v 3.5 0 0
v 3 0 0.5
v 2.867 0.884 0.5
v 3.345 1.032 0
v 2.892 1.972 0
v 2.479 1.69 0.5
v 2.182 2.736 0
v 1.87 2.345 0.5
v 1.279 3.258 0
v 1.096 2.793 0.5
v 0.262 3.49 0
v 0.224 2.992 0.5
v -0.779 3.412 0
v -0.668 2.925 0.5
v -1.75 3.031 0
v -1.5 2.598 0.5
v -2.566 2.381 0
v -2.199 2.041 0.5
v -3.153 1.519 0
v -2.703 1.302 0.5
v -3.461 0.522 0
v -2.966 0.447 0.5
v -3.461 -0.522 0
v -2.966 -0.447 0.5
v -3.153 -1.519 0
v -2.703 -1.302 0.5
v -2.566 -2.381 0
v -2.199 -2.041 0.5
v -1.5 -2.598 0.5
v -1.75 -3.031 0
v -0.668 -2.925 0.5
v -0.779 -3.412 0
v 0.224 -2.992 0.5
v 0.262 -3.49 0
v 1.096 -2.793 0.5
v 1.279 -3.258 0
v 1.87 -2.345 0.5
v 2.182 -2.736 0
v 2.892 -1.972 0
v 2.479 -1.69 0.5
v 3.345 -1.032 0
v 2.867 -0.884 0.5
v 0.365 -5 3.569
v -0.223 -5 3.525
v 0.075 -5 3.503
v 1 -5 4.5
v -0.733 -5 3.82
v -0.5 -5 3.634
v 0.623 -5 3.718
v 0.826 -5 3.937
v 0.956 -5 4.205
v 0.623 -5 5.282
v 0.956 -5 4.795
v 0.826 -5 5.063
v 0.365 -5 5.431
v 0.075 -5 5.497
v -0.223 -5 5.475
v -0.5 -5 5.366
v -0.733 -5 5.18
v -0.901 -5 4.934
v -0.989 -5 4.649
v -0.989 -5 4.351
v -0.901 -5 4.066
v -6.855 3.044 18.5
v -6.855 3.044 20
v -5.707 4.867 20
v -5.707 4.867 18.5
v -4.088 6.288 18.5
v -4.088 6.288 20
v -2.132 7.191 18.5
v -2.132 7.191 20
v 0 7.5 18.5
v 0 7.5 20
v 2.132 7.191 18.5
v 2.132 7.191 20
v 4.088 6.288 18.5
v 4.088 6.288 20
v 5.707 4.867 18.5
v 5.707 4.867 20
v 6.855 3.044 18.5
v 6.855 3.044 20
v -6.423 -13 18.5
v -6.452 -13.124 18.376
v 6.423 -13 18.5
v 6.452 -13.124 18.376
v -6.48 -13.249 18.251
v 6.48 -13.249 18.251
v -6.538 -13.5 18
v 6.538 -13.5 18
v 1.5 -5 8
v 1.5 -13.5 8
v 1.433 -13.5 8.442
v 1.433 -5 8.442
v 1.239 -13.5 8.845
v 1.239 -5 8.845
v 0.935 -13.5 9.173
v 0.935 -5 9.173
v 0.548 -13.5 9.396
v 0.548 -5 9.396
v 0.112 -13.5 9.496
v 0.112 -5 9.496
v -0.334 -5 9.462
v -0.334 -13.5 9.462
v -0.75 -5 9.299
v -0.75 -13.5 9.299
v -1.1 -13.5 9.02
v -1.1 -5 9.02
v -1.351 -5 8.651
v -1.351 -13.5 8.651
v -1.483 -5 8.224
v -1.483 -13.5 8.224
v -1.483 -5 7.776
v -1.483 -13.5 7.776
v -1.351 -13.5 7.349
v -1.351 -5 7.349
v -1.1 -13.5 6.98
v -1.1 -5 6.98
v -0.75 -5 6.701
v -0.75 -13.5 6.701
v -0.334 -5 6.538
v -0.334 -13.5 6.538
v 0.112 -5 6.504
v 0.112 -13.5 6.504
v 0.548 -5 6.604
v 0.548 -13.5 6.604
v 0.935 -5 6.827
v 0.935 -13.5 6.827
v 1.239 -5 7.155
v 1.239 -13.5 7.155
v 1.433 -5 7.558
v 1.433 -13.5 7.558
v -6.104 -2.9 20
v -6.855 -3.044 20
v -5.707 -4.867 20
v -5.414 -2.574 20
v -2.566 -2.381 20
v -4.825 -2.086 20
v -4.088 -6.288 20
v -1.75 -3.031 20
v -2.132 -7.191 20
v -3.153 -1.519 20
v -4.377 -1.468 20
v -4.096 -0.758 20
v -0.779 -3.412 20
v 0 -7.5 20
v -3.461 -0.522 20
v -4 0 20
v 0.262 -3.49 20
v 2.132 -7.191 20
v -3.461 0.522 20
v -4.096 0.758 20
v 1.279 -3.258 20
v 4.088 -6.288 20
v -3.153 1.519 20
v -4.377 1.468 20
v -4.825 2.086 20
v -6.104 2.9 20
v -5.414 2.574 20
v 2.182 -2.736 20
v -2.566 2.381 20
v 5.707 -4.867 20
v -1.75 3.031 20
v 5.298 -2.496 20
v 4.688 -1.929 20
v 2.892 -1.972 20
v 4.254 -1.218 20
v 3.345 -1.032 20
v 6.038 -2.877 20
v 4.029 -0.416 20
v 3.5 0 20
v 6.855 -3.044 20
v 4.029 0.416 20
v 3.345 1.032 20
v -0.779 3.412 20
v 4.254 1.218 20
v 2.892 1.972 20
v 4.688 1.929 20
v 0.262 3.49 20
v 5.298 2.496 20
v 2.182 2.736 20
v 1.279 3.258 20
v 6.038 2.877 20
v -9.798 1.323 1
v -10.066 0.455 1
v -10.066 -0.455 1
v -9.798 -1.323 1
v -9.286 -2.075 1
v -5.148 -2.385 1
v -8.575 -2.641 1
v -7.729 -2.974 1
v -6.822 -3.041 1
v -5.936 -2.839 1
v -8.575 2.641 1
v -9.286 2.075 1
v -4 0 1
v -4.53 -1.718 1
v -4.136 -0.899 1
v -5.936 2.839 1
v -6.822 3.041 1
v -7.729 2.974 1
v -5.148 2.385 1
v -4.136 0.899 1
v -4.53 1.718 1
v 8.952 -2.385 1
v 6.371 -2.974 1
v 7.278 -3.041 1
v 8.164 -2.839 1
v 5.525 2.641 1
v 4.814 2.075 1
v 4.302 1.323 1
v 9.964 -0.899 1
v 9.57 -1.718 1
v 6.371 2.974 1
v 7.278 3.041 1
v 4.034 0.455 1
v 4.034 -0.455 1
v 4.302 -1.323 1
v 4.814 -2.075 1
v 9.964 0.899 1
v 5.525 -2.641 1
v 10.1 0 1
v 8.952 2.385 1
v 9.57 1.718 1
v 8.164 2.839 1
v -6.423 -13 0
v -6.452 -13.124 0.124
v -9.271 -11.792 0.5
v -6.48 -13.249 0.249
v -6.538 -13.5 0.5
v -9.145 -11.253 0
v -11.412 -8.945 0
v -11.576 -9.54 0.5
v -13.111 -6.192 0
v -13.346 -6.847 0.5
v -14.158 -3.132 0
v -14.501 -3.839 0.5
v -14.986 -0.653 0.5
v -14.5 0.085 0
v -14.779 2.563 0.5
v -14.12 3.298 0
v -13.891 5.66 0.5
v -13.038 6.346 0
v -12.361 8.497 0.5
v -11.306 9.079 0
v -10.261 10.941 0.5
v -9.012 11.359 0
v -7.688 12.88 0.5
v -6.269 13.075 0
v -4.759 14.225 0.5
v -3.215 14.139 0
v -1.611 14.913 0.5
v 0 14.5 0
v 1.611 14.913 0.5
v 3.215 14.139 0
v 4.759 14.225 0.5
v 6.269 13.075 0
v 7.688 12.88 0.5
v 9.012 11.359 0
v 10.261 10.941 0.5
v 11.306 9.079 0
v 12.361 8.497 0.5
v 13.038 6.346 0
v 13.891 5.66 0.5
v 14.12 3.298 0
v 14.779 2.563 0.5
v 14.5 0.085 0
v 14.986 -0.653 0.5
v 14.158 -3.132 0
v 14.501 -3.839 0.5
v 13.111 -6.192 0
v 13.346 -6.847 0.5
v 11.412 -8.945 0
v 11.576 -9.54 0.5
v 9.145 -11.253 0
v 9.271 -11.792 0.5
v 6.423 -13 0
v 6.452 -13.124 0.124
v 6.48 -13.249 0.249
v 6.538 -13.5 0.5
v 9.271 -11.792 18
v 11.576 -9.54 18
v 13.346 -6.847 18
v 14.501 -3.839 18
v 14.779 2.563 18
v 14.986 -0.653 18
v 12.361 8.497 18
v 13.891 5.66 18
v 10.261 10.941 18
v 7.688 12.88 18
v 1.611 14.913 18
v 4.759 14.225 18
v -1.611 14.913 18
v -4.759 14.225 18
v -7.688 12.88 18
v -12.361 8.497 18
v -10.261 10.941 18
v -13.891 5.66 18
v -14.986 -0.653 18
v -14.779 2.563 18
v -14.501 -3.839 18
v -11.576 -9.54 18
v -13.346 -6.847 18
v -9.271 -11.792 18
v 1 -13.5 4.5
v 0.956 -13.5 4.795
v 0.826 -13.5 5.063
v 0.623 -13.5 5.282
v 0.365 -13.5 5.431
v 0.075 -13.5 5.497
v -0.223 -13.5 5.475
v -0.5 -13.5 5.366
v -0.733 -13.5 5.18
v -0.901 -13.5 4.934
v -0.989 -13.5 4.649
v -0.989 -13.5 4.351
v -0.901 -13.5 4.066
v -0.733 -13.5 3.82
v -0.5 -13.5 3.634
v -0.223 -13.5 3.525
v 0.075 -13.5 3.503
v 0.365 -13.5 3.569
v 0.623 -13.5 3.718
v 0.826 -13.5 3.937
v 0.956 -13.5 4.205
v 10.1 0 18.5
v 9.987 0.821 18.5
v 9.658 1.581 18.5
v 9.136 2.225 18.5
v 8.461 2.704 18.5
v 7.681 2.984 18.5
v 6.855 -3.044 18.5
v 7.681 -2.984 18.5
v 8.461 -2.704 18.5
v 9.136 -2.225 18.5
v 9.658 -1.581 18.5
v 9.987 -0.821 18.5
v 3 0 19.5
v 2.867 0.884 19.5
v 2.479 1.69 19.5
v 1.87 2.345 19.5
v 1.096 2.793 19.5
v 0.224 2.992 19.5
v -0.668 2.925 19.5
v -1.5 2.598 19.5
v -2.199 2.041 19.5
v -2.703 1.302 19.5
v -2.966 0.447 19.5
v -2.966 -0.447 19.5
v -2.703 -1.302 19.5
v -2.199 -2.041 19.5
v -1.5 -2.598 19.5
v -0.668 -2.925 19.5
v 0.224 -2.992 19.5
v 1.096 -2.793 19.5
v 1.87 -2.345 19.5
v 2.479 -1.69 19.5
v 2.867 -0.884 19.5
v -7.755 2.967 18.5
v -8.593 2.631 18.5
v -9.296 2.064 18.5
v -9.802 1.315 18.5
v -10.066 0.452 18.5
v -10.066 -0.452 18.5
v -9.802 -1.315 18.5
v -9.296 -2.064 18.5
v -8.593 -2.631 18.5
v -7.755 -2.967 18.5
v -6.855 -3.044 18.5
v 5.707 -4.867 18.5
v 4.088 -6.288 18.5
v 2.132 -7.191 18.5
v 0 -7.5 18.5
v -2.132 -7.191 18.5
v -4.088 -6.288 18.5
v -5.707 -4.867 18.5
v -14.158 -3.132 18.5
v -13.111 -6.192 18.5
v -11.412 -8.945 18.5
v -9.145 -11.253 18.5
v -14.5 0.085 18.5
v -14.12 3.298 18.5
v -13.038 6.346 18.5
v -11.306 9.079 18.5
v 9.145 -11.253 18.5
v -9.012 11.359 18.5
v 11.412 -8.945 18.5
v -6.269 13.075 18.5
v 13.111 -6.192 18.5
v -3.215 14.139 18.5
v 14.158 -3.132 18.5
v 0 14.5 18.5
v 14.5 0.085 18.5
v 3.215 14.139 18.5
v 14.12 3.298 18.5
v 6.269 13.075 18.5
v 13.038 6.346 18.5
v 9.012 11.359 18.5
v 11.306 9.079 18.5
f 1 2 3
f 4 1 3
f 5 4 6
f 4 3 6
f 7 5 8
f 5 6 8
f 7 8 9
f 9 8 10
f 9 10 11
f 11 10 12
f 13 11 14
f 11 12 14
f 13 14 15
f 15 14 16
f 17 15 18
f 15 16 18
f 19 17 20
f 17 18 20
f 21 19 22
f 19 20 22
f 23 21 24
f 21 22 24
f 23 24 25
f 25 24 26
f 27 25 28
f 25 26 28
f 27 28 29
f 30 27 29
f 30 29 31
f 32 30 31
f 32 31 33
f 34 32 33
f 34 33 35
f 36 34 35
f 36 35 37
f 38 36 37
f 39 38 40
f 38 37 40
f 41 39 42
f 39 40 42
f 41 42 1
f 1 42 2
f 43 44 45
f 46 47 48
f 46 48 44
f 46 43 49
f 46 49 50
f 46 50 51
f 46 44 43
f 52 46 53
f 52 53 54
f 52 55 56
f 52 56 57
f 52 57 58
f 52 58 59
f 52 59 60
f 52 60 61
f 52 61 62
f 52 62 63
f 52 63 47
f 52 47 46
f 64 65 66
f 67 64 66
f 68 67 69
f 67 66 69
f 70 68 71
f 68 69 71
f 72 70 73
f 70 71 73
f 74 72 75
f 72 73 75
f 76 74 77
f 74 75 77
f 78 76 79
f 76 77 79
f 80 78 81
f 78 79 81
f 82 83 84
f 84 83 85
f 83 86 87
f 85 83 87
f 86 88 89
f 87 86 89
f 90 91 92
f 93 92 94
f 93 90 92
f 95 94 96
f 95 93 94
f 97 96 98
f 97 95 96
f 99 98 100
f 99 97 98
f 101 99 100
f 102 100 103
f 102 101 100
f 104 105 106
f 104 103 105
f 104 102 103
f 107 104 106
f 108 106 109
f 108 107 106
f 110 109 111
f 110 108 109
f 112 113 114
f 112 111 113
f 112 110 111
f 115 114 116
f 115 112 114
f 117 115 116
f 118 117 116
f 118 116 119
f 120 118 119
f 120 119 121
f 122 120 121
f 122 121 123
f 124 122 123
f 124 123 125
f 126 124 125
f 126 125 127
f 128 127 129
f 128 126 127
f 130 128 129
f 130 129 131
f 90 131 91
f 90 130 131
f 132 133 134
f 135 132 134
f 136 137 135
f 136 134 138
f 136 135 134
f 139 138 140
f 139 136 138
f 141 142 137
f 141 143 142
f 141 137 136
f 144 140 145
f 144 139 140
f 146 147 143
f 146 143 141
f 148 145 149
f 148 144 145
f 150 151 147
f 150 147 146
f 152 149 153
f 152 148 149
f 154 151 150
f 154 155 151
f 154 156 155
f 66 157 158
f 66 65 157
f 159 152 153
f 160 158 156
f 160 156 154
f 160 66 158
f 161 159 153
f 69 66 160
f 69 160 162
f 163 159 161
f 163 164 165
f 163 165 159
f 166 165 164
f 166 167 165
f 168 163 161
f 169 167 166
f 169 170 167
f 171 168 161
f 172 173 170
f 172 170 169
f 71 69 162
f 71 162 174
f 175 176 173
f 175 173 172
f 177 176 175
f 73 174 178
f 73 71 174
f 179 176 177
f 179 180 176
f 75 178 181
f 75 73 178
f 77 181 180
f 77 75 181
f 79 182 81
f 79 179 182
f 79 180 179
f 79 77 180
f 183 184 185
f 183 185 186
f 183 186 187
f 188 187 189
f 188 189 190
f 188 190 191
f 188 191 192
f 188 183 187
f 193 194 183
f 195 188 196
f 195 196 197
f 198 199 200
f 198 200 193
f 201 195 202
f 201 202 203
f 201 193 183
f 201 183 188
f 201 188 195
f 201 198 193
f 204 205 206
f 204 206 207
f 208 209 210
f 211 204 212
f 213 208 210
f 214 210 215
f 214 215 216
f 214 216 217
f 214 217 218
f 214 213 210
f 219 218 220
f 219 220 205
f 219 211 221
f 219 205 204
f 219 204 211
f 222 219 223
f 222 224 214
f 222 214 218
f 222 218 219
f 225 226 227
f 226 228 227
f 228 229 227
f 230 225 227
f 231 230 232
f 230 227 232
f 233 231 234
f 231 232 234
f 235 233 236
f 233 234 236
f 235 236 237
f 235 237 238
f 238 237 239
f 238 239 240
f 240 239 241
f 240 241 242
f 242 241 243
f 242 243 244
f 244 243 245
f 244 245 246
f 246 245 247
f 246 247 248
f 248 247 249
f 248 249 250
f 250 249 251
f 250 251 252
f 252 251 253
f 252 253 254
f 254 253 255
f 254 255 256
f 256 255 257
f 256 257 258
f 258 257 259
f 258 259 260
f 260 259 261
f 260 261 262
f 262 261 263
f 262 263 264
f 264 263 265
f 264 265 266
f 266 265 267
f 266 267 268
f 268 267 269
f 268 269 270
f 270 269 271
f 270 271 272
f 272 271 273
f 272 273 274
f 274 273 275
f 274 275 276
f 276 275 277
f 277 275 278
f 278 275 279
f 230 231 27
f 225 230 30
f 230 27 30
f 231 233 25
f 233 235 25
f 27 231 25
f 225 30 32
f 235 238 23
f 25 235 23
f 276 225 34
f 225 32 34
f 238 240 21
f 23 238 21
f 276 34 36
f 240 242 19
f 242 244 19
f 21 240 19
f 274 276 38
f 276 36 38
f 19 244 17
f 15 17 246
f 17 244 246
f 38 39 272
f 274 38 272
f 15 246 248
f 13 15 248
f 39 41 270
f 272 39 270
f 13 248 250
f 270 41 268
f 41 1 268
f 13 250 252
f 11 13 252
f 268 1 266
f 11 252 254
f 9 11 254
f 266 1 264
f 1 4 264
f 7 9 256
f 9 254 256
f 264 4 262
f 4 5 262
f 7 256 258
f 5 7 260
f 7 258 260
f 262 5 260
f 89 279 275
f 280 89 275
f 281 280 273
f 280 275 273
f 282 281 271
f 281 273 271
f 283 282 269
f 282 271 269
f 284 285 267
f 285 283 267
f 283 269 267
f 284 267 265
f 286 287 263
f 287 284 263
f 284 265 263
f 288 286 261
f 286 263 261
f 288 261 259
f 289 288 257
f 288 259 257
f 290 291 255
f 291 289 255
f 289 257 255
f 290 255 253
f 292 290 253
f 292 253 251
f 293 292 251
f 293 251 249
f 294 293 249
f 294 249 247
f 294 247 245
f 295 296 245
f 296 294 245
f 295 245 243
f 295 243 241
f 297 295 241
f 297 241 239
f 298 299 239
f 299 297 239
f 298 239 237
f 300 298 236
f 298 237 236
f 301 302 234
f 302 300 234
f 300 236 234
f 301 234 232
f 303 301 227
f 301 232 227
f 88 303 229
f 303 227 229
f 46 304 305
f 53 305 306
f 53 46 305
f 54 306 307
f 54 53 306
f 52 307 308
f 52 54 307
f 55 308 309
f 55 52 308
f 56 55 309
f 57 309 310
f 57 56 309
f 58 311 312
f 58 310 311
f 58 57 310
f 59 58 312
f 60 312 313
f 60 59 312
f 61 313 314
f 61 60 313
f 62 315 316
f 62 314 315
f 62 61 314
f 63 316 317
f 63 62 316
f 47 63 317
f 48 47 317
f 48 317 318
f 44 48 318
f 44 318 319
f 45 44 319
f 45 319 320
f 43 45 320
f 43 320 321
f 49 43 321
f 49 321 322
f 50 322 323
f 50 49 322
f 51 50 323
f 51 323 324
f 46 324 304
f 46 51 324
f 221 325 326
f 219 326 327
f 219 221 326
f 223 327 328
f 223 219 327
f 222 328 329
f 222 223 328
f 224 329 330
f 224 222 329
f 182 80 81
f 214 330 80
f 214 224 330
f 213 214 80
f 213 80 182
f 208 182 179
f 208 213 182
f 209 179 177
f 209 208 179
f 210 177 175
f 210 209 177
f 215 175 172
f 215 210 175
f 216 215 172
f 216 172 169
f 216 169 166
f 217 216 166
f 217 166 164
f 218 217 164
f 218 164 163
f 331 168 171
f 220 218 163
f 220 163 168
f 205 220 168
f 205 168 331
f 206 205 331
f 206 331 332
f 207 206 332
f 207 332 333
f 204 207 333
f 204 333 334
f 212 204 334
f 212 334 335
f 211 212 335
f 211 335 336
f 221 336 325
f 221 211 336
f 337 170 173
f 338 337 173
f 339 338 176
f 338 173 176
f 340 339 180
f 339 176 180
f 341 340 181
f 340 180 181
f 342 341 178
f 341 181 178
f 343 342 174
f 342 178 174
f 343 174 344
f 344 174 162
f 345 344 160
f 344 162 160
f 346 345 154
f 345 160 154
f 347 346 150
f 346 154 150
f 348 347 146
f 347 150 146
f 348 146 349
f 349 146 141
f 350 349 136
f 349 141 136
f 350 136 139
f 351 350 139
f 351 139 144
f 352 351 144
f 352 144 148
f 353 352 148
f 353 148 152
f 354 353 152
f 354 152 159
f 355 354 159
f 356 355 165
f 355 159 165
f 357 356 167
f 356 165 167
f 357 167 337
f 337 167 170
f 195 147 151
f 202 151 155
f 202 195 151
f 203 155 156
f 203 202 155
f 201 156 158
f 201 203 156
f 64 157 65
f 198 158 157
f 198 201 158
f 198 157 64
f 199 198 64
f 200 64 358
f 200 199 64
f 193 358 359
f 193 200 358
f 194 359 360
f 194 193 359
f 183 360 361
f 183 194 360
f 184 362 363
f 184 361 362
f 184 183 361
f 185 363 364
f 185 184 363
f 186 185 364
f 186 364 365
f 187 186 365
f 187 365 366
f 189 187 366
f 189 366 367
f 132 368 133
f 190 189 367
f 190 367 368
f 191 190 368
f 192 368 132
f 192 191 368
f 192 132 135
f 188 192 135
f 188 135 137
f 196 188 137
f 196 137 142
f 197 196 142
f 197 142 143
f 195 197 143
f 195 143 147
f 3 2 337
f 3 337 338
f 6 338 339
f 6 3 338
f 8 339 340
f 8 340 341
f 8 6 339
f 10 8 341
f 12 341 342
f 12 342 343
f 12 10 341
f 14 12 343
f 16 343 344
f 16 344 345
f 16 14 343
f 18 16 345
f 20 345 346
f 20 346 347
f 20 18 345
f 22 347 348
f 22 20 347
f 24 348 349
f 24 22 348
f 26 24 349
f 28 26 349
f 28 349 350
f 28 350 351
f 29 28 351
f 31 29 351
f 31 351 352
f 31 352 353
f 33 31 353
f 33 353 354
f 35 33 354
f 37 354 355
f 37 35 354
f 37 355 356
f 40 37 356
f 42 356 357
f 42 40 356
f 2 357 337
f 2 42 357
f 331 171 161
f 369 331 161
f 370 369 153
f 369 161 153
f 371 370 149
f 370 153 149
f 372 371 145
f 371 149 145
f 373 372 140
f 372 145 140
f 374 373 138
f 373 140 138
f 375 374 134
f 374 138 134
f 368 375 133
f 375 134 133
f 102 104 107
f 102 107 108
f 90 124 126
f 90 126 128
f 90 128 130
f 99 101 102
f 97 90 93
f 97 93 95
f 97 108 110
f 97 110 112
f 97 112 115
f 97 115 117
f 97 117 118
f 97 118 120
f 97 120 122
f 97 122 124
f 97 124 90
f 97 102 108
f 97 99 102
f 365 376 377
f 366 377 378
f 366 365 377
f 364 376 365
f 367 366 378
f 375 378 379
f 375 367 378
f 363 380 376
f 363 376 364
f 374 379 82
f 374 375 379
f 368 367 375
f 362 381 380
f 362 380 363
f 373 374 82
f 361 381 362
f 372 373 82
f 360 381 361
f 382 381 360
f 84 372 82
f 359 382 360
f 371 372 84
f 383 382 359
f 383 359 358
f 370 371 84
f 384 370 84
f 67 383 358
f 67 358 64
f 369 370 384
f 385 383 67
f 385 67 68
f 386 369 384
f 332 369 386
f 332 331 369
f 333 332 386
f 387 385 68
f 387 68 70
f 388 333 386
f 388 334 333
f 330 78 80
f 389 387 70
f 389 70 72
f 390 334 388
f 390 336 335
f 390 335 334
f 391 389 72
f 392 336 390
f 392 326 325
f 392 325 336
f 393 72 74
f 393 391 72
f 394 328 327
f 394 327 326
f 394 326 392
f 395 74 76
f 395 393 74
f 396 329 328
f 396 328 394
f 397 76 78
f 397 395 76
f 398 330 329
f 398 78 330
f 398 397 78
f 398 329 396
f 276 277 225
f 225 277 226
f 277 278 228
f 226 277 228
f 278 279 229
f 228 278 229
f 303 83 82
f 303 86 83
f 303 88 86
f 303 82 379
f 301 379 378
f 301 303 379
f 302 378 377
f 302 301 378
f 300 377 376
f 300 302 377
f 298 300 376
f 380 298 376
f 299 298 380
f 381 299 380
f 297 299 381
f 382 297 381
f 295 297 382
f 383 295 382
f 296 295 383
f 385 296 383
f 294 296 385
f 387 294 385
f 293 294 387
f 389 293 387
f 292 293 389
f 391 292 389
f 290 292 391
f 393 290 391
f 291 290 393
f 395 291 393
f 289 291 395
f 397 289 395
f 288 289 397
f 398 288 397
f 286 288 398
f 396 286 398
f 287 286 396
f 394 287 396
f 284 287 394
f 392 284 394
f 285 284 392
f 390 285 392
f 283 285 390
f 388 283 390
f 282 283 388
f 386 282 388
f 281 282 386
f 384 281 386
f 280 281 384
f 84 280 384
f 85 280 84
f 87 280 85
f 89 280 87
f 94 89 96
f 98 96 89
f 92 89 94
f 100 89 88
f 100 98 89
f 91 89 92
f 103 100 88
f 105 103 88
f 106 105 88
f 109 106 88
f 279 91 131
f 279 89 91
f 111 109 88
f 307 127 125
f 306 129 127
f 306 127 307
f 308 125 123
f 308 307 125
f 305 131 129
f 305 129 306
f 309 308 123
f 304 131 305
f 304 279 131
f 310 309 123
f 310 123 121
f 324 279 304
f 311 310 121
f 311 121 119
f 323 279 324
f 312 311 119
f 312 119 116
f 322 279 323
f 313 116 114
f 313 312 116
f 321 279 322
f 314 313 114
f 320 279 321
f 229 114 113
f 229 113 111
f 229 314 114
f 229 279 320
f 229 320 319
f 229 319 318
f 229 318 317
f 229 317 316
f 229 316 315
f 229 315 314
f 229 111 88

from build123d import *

# Parameters (mm, degrees)
F0_R     = 15
F0_R_2   = 3.05
F0_R_3   = 3
F1_DEPTH = 20
F2_DEPTH = 1
F3_R     = 15
F4_DEPTH = 1.5
F6_START = 5
F5_R     = 1
F5_R_2   = 1.5
F6_DEPTH = 20
F8_DEPTH = 25
F9_SIZE  = 0.5


with BuildPart() as f1:
    # F0 (on Top) → F1 (new body)
    with BuildSketch(Plane.XY):
        Circle(F0_R)
        with Locations((-7.05, 0)):
            Circle(F0_R_2, mode=Mode.SUBTRACT)
        Circle(F0_R_3, mode=Mode.SUBTRACT)
        with Locations((7.05, 0)):
            Circle(F0_R_2, mode=Mode.SUBTRACT)
    extrude(amount=F1_DEPTH)

    # F0 (on Top) → F2 (join)
    with BuildSketch(Plane.XY):
        with Locations((-7.05, 0)):
            Circle(F0_R_2)
        with Locations((7.05, 0)):
            Circle(F0_R_2)
    extrude(amount=F2_DEPTH)

    # F3 (on face) → F4 (cut)
    with BuildSketch(Plane.XY.offset(20)):
        Circle(F3_R)
        with BuildLine():
            ThreePointArc((-6.8546099291, 3.0437349951), (0, 7.5), (6.8546099291, 3.0437349951))
            ThreePointArc((6.8546099291, 3.0437349951), (9.1364515671, 2.2246842154), (10.1, 0))
            ThreePointArc((10.1, 0), (9.1364515671, -2.2246842154), (6.8546099291, -3.0437349951))
            ThreePointArc((6.8546099291, -3.0437349951), (0, -7.5), (-6.8546099291, -3.0437349951))
            ThreePointArc((-6.8546099291, -3.0437349951), (-10.1, 0), (-6.8546099291, 3.0437349951))
        make_face(mode=Mode.SUBTRACT)
    extrude(amount=-F4_DEPTH, mode=Mode.SUBTRACT)

    # F5 (on Front) → F6 (cut)
    with BuildSketch(Plane.XZ.offset(F6_START)):
        with Locations((0, 4.5)):
            Circle(F5_R)
        with Locations((0, 8)):
            Circle(F5_R_2)
    extrude(amount=F6_DEPTH, mode=Mode.SUBTRACT)

    # F7 (on face) → F8 (cut)
    with BuildSketch(Plane.XY):
        with BuildLine():
            Line((6.5383484153, -13.5), (-6.5383484153, -13.5))
            ThreePointArc((-6.5383484153, -13.5), (0, -15), (6.5383484153, -13.5))
        make_face()
    extrude(amount=F8_DEPTH, mode=Mode.SUBTRACT)

    # F9
    f9_edges = [f1.edges().sort_by_distance(p)[0] for p in [
        (0, 15, 0),
        (0, -13.5, 0),
        (-3, 0, 0),
        (0, 15, 18.5),
        (-3, 0, 20),
        (0, -13.5, 18.5),
    ]]
    chamfer(f9_edges, length=F9_SIZE)


solid = f1.part
